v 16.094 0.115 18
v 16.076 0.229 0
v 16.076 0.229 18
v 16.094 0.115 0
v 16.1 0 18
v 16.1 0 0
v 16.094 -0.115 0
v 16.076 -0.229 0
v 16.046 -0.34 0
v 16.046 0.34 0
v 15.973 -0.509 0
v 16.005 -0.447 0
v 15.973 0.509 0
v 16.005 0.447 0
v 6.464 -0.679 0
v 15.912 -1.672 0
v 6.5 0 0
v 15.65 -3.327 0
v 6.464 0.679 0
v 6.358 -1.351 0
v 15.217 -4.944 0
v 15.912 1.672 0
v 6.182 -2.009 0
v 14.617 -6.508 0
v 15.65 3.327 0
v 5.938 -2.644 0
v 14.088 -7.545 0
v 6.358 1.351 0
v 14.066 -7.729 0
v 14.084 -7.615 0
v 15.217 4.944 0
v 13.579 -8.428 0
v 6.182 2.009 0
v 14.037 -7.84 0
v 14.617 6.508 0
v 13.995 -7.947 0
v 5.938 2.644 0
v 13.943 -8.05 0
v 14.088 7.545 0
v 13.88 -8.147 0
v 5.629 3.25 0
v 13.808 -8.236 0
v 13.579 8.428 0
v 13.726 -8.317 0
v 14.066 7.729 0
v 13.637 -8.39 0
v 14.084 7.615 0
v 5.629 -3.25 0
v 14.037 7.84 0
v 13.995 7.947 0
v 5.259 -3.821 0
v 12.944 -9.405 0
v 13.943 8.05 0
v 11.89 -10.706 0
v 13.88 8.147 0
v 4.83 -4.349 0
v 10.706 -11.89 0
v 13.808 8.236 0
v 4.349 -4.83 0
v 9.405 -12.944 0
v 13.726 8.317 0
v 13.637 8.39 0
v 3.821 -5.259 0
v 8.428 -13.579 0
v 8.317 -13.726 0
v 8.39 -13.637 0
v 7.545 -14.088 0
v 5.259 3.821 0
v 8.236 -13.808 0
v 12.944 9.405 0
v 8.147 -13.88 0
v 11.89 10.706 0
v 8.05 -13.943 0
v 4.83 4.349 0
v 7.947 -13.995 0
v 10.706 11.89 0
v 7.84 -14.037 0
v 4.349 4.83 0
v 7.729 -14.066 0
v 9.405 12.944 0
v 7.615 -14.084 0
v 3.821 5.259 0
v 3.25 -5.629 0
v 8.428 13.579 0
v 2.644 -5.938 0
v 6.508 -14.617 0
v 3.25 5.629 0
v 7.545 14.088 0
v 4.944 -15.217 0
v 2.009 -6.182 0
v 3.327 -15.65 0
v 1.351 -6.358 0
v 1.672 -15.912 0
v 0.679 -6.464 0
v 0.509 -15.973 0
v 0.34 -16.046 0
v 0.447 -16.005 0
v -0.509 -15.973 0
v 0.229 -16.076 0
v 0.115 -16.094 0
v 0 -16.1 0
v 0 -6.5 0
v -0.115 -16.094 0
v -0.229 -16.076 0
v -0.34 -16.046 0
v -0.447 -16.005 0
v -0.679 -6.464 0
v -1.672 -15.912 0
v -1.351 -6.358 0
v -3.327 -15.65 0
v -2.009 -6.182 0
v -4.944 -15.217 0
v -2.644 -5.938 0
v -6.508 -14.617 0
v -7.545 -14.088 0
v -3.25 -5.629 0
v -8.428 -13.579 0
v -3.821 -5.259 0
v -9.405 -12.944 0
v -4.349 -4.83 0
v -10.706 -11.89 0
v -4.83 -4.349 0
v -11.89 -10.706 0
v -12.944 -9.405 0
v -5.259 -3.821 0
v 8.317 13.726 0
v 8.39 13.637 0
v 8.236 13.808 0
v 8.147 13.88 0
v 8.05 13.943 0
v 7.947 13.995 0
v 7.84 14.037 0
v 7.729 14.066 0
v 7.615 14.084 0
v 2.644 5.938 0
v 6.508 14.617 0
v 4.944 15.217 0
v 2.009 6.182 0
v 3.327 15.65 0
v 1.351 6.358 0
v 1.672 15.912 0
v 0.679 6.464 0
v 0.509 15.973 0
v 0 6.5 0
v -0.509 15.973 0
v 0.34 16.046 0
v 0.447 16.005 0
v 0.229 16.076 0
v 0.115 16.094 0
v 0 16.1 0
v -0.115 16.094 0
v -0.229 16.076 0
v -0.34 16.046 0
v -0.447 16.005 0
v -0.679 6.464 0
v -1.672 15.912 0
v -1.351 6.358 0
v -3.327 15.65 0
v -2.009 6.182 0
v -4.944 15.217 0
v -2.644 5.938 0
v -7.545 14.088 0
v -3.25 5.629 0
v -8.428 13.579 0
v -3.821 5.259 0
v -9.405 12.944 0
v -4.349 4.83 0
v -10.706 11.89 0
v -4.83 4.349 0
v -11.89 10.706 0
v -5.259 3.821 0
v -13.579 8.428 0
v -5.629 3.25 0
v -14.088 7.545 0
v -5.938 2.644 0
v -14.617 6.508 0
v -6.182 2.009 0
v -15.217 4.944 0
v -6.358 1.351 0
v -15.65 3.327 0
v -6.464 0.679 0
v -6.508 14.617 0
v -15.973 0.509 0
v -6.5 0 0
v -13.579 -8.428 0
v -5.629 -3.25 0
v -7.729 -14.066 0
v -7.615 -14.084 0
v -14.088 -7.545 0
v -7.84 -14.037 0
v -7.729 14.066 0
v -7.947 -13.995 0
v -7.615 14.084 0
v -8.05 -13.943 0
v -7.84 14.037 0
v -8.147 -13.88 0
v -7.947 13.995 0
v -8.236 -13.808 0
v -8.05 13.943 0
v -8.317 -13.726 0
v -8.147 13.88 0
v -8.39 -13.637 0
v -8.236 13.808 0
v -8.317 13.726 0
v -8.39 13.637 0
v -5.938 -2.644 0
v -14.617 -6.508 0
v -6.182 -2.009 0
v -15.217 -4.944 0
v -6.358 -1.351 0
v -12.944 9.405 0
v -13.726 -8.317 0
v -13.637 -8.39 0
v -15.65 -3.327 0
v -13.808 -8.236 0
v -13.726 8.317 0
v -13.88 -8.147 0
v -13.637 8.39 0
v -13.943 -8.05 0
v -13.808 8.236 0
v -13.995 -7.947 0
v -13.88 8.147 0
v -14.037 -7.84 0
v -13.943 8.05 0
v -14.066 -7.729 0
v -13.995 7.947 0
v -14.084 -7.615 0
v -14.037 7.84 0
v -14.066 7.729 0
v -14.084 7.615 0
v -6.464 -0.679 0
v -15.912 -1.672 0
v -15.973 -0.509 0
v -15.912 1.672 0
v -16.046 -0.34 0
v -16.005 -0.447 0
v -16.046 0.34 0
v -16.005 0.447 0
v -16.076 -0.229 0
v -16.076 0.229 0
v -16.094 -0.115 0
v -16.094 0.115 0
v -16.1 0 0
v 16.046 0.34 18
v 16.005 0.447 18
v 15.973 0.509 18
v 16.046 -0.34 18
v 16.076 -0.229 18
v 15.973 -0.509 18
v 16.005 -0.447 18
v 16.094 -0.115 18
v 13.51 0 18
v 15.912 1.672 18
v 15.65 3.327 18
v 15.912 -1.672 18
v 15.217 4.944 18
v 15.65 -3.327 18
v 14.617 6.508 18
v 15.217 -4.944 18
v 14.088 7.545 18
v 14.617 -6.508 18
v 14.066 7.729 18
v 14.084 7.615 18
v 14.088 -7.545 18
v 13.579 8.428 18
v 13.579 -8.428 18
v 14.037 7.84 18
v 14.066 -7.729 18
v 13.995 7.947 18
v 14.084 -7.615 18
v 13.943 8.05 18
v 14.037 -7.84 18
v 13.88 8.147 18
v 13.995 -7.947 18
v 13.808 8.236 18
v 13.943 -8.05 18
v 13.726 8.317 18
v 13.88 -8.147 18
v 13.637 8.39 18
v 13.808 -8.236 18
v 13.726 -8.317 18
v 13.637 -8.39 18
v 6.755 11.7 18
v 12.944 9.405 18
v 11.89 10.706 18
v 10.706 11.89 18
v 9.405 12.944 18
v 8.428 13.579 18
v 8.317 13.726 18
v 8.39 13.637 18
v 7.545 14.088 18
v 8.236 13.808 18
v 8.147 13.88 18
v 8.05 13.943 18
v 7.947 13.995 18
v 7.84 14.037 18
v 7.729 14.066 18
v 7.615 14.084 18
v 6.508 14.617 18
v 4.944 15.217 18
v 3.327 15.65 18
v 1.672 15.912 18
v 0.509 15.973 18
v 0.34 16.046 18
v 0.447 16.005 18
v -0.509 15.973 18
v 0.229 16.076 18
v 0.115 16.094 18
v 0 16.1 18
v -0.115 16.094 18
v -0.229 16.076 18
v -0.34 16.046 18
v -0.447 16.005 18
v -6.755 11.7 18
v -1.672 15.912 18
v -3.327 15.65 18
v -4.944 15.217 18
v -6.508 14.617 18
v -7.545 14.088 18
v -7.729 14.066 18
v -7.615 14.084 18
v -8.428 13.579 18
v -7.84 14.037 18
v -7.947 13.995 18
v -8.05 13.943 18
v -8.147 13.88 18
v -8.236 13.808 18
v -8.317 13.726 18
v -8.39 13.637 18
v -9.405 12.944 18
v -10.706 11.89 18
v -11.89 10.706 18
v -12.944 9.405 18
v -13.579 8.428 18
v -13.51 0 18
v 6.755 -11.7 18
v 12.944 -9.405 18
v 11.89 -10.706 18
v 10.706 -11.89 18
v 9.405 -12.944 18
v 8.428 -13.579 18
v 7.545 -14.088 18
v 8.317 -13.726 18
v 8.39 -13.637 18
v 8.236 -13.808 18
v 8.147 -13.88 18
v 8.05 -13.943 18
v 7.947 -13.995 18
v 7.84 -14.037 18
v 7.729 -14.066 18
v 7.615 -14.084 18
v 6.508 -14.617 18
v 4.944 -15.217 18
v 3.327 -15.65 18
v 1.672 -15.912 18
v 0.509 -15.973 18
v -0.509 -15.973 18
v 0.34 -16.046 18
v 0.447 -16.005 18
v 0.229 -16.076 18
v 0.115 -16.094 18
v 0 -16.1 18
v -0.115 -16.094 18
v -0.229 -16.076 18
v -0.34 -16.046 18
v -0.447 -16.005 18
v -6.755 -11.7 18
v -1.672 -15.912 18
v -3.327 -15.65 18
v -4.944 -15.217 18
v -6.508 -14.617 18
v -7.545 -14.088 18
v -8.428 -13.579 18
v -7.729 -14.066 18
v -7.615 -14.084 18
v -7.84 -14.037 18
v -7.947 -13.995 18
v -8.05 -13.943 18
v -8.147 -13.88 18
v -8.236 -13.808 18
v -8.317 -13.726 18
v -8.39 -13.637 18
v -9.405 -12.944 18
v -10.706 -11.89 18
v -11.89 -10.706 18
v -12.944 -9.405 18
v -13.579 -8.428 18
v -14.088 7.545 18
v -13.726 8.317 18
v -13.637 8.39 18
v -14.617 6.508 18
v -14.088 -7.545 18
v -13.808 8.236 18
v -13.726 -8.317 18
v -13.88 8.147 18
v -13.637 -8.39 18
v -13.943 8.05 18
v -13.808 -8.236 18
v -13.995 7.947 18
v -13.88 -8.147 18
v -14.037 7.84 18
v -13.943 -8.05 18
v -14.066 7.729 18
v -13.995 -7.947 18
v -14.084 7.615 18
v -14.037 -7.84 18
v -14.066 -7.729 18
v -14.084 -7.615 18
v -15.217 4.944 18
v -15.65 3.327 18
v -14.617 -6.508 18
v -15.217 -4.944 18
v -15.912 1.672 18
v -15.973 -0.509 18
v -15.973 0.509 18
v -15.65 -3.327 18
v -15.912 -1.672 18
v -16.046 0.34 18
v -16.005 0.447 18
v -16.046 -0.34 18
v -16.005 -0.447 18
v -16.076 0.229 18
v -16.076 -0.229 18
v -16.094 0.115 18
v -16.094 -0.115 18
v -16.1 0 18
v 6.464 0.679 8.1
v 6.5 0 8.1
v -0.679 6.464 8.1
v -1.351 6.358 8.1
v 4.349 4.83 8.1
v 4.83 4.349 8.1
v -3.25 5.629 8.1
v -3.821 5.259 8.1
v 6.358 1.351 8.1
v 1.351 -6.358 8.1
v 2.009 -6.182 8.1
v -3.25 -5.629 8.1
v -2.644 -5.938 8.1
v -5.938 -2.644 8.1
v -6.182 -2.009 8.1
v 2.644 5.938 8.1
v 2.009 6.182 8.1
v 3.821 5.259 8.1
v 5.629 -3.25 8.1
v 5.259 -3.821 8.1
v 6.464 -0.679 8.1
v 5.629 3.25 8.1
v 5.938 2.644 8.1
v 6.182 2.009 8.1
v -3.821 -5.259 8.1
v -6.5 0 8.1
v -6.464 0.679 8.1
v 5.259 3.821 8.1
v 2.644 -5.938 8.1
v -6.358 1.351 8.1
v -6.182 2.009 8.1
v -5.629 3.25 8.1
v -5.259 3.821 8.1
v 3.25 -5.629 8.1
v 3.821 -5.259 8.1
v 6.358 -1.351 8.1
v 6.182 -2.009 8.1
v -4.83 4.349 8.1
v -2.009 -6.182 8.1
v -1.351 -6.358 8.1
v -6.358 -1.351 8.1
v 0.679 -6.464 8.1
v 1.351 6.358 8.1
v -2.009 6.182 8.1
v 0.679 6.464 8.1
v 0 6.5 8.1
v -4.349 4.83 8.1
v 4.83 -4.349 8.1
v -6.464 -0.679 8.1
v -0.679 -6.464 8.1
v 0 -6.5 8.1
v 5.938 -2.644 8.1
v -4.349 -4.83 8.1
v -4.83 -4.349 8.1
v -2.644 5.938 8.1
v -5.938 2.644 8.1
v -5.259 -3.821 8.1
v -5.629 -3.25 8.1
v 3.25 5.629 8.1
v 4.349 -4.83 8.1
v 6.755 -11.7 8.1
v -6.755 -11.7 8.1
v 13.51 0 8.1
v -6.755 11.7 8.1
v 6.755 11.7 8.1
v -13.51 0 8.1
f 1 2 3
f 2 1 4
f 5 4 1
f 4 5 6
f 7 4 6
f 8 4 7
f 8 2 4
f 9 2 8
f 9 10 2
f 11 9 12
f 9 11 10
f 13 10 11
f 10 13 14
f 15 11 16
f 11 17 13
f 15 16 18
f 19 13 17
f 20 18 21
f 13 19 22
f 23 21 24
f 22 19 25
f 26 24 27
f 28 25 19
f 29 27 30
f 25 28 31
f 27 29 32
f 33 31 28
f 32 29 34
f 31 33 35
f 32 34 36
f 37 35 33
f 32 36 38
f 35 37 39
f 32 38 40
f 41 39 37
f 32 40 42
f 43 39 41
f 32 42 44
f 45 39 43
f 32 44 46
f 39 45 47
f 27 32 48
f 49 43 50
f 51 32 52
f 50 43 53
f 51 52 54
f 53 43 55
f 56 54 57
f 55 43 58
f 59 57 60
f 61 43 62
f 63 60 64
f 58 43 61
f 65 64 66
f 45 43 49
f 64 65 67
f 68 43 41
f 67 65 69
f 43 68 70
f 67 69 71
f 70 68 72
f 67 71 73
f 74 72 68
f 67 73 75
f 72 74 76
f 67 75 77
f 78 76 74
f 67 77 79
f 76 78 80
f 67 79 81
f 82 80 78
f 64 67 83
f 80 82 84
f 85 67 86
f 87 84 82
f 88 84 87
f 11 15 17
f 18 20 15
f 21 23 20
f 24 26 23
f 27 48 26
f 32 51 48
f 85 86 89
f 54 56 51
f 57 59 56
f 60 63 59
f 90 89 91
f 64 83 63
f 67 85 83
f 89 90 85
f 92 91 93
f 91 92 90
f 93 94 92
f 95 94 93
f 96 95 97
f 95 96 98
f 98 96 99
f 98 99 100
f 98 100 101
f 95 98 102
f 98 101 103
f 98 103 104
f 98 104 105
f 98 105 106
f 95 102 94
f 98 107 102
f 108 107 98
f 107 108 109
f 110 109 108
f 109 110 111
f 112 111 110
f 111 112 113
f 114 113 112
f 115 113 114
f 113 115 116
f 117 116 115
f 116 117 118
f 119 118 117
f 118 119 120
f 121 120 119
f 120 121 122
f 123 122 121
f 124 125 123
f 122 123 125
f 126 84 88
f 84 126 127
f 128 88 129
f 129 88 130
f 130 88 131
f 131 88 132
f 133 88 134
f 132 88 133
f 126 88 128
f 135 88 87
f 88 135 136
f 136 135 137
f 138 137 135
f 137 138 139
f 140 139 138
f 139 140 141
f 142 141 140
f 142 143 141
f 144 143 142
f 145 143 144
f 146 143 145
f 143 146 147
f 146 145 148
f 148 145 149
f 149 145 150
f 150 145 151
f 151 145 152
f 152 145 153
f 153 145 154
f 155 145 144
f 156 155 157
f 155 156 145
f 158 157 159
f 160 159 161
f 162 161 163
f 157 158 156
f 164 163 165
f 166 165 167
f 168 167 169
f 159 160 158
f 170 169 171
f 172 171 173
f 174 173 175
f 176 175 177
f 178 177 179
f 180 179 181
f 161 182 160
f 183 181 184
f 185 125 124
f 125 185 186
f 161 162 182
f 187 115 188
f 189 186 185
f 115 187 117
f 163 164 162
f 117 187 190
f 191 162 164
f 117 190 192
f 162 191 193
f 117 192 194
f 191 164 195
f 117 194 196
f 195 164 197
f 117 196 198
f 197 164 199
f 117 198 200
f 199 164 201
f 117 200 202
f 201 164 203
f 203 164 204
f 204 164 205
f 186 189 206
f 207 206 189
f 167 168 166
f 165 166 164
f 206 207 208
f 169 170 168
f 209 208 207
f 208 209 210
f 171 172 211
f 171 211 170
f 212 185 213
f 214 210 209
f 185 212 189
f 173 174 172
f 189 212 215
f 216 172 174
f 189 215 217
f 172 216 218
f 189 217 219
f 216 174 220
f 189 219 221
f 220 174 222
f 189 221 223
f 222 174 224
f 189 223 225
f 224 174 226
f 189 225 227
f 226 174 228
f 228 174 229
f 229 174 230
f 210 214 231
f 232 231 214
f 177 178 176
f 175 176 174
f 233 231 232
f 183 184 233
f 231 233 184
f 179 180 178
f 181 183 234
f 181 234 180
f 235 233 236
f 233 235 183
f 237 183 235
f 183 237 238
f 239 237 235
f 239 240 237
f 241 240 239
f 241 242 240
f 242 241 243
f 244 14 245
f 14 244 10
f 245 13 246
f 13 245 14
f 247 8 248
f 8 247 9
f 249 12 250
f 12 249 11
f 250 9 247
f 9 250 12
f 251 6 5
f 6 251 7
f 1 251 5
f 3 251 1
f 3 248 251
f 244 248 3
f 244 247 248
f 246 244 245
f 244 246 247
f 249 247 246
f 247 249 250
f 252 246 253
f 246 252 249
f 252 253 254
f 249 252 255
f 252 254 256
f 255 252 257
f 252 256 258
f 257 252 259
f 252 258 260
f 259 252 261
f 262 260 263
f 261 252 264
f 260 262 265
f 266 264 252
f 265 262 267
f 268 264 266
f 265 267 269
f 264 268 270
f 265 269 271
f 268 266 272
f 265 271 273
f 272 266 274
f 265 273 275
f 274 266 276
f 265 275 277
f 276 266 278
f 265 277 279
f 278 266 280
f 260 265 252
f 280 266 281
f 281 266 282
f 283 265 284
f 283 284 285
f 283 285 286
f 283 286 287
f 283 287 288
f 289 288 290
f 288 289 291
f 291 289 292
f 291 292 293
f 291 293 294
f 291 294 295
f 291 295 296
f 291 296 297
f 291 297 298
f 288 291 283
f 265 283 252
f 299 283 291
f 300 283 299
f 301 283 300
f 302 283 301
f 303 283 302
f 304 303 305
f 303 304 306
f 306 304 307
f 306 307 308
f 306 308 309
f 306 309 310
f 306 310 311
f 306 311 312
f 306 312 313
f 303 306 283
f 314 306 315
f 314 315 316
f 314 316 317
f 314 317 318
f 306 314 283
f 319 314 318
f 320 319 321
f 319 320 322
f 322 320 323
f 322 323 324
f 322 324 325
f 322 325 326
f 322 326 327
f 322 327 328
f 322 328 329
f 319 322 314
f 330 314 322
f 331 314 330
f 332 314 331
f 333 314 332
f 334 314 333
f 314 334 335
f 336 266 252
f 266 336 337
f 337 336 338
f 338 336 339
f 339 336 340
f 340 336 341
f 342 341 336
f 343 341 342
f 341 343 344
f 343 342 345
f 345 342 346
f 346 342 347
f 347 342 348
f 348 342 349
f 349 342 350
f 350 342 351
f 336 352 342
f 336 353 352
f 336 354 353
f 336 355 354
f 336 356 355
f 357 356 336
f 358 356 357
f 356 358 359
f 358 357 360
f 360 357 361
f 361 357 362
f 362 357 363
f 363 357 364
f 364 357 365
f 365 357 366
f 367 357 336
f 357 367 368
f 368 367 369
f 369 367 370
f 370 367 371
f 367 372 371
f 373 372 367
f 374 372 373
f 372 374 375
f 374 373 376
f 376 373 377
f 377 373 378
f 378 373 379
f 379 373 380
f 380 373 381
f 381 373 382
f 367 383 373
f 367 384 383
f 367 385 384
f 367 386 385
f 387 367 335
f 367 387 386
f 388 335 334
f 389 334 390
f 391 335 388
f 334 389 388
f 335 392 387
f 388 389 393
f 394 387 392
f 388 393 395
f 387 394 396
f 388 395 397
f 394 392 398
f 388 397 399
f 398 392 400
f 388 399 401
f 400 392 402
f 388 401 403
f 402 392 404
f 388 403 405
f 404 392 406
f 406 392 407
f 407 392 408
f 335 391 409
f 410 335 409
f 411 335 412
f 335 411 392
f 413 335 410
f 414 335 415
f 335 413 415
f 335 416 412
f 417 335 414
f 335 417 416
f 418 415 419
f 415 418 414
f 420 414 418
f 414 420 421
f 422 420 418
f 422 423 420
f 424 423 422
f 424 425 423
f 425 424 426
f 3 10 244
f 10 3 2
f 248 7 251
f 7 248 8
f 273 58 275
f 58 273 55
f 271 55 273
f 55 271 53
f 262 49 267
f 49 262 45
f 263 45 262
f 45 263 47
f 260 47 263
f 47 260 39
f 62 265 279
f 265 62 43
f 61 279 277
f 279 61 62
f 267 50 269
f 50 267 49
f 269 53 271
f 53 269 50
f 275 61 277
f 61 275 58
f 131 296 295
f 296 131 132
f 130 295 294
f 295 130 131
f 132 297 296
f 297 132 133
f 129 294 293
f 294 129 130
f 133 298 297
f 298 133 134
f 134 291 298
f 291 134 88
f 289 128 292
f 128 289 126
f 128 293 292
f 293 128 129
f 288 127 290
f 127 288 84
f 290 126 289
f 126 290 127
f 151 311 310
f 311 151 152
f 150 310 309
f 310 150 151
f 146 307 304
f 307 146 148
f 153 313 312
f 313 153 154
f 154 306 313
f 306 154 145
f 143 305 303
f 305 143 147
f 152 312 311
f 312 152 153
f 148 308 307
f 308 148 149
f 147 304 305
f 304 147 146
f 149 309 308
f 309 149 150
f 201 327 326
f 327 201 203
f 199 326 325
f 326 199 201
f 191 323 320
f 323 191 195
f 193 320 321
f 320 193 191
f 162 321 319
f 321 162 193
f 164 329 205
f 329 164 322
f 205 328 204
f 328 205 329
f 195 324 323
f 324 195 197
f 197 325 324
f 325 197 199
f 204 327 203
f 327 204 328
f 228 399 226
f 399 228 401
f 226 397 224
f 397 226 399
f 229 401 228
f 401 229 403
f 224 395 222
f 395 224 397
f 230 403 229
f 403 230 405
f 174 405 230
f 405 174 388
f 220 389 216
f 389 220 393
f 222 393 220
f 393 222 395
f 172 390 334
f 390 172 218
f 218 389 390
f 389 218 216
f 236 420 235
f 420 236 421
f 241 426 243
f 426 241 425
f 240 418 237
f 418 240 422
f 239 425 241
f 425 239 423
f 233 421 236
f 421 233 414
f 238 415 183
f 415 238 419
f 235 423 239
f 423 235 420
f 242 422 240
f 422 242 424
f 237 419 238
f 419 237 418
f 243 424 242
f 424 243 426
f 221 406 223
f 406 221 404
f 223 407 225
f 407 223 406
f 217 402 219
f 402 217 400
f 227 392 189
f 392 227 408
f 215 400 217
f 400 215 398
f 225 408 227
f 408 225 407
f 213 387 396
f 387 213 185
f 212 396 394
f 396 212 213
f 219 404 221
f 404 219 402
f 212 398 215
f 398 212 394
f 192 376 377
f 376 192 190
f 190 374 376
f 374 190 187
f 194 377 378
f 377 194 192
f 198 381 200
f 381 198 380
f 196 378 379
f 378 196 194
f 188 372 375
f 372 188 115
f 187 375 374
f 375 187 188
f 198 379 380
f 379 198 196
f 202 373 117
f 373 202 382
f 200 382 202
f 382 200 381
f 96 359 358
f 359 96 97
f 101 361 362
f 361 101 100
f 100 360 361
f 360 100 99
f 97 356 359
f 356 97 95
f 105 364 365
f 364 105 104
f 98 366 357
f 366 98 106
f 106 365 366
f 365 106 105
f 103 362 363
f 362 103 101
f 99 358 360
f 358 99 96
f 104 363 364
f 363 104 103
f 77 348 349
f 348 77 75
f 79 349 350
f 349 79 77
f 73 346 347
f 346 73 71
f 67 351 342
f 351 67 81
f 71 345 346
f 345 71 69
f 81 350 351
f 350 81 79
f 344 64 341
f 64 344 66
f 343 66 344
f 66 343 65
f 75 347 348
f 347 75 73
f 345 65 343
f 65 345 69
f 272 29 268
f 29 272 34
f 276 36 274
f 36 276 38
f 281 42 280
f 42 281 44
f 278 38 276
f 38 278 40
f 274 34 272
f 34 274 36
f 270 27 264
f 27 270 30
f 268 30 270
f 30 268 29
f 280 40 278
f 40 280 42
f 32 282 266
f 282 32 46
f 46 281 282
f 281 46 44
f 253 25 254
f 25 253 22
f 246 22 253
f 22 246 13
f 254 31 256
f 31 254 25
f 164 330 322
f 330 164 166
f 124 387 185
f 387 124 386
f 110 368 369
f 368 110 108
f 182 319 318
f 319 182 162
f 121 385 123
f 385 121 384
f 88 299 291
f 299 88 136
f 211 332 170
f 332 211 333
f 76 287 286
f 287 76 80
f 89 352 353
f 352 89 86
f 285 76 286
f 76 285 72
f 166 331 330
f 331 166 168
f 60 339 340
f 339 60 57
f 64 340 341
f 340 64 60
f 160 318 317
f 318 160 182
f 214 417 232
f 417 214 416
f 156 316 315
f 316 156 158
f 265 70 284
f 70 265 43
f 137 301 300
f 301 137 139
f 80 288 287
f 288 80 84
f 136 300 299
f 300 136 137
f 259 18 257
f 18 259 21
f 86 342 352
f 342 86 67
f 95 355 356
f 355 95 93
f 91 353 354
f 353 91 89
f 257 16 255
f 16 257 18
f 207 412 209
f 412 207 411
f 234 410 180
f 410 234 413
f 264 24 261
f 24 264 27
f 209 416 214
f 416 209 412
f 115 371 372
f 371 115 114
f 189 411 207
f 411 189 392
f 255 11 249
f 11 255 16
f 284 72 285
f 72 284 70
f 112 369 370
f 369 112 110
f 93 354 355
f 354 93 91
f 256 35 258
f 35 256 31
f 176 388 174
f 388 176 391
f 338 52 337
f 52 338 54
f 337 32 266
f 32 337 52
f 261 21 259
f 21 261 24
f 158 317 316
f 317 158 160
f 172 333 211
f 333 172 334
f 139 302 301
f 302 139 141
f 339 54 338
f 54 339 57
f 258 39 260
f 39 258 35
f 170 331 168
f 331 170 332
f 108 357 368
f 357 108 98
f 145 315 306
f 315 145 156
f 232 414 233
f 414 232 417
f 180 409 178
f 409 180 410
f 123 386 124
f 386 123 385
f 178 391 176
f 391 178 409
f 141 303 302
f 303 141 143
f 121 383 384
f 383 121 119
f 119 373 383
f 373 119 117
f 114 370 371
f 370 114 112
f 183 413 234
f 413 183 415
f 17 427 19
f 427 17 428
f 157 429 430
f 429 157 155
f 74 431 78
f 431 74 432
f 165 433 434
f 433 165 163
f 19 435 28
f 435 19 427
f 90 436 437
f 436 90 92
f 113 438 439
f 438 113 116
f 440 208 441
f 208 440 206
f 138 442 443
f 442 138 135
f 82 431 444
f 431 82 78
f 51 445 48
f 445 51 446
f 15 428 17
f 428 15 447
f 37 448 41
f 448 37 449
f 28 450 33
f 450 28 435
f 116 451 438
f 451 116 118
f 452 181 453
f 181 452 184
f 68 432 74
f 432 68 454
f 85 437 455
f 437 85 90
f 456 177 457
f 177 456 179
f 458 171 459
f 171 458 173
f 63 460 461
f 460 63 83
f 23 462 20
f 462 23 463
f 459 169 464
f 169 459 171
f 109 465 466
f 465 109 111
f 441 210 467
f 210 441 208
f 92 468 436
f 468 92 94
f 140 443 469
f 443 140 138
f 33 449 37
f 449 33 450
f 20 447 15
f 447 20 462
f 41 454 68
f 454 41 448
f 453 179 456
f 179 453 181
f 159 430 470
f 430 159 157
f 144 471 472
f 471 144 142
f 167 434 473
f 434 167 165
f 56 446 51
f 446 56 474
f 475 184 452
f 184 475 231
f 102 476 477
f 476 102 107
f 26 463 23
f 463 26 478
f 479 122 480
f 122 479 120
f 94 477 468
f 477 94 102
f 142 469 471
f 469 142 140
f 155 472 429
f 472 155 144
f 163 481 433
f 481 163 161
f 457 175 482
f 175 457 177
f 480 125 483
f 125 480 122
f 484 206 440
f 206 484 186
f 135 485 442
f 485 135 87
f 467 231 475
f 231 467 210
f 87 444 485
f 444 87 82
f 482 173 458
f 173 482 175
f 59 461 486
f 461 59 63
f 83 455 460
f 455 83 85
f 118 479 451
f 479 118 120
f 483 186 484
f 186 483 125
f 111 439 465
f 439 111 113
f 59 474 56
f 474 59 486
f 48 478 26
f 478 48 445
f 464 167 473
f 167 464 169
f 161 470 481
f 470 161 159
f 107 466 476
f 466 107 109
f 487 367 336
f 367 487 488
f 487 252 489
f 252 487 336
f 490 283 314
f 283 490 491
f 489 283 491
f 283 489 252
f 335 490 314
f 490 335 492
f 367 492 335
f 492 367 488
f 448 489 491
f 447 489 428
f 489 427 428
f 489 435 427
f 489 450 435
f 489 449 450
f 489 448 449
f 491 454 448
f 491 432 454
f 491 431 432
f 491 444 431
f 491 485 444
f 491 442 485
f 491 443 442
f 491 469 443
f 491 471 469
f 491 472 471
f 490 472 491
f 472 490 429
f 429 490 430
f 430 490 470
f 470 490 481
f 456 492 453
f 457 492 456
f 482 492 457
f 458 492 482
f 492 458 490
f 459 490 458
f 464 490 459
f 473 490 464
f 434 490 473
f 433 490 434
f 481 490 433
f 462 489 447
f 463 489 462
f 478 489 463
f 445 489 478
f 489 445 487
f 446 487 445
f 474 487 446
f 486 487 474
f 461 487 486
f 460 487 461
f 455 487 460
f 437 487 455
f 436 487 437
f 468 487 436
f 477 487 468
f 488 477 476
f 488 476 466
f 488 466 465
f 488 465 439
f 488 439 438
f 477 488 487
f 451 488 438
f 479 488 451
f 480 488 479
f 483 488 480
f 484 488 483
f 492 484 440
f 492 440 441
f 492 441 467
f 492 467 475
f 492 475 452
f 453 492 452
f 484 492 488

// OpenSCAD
// Knurled-style thumb knob with hex socket.
$fn = 60;
eps = 0.02;
thread_d = 13;
knob_d = 32;
knob_h = 18;
socket_flat = thread_d * 1.8;
difference() {
    union() {
        cylinder(d = knob_d, h = knob_h);
        for (i = [0 : 11]) rotate([0, 0, i * 30]) translate([knob_d / 2 - 1, 0, 0]) cylinder(d = 2.2, h = knob_h);
    }
    translate([0, 0, -eps]) cylinder(d = thread_d, h = knob_h + 2 * eps);
    translate([0, 0, knob_h - knob_h * 0.55]) cylinder(d = socket_flat / cos(30), h = knob_h * 0.55 + eps, $fn = 6);
}
